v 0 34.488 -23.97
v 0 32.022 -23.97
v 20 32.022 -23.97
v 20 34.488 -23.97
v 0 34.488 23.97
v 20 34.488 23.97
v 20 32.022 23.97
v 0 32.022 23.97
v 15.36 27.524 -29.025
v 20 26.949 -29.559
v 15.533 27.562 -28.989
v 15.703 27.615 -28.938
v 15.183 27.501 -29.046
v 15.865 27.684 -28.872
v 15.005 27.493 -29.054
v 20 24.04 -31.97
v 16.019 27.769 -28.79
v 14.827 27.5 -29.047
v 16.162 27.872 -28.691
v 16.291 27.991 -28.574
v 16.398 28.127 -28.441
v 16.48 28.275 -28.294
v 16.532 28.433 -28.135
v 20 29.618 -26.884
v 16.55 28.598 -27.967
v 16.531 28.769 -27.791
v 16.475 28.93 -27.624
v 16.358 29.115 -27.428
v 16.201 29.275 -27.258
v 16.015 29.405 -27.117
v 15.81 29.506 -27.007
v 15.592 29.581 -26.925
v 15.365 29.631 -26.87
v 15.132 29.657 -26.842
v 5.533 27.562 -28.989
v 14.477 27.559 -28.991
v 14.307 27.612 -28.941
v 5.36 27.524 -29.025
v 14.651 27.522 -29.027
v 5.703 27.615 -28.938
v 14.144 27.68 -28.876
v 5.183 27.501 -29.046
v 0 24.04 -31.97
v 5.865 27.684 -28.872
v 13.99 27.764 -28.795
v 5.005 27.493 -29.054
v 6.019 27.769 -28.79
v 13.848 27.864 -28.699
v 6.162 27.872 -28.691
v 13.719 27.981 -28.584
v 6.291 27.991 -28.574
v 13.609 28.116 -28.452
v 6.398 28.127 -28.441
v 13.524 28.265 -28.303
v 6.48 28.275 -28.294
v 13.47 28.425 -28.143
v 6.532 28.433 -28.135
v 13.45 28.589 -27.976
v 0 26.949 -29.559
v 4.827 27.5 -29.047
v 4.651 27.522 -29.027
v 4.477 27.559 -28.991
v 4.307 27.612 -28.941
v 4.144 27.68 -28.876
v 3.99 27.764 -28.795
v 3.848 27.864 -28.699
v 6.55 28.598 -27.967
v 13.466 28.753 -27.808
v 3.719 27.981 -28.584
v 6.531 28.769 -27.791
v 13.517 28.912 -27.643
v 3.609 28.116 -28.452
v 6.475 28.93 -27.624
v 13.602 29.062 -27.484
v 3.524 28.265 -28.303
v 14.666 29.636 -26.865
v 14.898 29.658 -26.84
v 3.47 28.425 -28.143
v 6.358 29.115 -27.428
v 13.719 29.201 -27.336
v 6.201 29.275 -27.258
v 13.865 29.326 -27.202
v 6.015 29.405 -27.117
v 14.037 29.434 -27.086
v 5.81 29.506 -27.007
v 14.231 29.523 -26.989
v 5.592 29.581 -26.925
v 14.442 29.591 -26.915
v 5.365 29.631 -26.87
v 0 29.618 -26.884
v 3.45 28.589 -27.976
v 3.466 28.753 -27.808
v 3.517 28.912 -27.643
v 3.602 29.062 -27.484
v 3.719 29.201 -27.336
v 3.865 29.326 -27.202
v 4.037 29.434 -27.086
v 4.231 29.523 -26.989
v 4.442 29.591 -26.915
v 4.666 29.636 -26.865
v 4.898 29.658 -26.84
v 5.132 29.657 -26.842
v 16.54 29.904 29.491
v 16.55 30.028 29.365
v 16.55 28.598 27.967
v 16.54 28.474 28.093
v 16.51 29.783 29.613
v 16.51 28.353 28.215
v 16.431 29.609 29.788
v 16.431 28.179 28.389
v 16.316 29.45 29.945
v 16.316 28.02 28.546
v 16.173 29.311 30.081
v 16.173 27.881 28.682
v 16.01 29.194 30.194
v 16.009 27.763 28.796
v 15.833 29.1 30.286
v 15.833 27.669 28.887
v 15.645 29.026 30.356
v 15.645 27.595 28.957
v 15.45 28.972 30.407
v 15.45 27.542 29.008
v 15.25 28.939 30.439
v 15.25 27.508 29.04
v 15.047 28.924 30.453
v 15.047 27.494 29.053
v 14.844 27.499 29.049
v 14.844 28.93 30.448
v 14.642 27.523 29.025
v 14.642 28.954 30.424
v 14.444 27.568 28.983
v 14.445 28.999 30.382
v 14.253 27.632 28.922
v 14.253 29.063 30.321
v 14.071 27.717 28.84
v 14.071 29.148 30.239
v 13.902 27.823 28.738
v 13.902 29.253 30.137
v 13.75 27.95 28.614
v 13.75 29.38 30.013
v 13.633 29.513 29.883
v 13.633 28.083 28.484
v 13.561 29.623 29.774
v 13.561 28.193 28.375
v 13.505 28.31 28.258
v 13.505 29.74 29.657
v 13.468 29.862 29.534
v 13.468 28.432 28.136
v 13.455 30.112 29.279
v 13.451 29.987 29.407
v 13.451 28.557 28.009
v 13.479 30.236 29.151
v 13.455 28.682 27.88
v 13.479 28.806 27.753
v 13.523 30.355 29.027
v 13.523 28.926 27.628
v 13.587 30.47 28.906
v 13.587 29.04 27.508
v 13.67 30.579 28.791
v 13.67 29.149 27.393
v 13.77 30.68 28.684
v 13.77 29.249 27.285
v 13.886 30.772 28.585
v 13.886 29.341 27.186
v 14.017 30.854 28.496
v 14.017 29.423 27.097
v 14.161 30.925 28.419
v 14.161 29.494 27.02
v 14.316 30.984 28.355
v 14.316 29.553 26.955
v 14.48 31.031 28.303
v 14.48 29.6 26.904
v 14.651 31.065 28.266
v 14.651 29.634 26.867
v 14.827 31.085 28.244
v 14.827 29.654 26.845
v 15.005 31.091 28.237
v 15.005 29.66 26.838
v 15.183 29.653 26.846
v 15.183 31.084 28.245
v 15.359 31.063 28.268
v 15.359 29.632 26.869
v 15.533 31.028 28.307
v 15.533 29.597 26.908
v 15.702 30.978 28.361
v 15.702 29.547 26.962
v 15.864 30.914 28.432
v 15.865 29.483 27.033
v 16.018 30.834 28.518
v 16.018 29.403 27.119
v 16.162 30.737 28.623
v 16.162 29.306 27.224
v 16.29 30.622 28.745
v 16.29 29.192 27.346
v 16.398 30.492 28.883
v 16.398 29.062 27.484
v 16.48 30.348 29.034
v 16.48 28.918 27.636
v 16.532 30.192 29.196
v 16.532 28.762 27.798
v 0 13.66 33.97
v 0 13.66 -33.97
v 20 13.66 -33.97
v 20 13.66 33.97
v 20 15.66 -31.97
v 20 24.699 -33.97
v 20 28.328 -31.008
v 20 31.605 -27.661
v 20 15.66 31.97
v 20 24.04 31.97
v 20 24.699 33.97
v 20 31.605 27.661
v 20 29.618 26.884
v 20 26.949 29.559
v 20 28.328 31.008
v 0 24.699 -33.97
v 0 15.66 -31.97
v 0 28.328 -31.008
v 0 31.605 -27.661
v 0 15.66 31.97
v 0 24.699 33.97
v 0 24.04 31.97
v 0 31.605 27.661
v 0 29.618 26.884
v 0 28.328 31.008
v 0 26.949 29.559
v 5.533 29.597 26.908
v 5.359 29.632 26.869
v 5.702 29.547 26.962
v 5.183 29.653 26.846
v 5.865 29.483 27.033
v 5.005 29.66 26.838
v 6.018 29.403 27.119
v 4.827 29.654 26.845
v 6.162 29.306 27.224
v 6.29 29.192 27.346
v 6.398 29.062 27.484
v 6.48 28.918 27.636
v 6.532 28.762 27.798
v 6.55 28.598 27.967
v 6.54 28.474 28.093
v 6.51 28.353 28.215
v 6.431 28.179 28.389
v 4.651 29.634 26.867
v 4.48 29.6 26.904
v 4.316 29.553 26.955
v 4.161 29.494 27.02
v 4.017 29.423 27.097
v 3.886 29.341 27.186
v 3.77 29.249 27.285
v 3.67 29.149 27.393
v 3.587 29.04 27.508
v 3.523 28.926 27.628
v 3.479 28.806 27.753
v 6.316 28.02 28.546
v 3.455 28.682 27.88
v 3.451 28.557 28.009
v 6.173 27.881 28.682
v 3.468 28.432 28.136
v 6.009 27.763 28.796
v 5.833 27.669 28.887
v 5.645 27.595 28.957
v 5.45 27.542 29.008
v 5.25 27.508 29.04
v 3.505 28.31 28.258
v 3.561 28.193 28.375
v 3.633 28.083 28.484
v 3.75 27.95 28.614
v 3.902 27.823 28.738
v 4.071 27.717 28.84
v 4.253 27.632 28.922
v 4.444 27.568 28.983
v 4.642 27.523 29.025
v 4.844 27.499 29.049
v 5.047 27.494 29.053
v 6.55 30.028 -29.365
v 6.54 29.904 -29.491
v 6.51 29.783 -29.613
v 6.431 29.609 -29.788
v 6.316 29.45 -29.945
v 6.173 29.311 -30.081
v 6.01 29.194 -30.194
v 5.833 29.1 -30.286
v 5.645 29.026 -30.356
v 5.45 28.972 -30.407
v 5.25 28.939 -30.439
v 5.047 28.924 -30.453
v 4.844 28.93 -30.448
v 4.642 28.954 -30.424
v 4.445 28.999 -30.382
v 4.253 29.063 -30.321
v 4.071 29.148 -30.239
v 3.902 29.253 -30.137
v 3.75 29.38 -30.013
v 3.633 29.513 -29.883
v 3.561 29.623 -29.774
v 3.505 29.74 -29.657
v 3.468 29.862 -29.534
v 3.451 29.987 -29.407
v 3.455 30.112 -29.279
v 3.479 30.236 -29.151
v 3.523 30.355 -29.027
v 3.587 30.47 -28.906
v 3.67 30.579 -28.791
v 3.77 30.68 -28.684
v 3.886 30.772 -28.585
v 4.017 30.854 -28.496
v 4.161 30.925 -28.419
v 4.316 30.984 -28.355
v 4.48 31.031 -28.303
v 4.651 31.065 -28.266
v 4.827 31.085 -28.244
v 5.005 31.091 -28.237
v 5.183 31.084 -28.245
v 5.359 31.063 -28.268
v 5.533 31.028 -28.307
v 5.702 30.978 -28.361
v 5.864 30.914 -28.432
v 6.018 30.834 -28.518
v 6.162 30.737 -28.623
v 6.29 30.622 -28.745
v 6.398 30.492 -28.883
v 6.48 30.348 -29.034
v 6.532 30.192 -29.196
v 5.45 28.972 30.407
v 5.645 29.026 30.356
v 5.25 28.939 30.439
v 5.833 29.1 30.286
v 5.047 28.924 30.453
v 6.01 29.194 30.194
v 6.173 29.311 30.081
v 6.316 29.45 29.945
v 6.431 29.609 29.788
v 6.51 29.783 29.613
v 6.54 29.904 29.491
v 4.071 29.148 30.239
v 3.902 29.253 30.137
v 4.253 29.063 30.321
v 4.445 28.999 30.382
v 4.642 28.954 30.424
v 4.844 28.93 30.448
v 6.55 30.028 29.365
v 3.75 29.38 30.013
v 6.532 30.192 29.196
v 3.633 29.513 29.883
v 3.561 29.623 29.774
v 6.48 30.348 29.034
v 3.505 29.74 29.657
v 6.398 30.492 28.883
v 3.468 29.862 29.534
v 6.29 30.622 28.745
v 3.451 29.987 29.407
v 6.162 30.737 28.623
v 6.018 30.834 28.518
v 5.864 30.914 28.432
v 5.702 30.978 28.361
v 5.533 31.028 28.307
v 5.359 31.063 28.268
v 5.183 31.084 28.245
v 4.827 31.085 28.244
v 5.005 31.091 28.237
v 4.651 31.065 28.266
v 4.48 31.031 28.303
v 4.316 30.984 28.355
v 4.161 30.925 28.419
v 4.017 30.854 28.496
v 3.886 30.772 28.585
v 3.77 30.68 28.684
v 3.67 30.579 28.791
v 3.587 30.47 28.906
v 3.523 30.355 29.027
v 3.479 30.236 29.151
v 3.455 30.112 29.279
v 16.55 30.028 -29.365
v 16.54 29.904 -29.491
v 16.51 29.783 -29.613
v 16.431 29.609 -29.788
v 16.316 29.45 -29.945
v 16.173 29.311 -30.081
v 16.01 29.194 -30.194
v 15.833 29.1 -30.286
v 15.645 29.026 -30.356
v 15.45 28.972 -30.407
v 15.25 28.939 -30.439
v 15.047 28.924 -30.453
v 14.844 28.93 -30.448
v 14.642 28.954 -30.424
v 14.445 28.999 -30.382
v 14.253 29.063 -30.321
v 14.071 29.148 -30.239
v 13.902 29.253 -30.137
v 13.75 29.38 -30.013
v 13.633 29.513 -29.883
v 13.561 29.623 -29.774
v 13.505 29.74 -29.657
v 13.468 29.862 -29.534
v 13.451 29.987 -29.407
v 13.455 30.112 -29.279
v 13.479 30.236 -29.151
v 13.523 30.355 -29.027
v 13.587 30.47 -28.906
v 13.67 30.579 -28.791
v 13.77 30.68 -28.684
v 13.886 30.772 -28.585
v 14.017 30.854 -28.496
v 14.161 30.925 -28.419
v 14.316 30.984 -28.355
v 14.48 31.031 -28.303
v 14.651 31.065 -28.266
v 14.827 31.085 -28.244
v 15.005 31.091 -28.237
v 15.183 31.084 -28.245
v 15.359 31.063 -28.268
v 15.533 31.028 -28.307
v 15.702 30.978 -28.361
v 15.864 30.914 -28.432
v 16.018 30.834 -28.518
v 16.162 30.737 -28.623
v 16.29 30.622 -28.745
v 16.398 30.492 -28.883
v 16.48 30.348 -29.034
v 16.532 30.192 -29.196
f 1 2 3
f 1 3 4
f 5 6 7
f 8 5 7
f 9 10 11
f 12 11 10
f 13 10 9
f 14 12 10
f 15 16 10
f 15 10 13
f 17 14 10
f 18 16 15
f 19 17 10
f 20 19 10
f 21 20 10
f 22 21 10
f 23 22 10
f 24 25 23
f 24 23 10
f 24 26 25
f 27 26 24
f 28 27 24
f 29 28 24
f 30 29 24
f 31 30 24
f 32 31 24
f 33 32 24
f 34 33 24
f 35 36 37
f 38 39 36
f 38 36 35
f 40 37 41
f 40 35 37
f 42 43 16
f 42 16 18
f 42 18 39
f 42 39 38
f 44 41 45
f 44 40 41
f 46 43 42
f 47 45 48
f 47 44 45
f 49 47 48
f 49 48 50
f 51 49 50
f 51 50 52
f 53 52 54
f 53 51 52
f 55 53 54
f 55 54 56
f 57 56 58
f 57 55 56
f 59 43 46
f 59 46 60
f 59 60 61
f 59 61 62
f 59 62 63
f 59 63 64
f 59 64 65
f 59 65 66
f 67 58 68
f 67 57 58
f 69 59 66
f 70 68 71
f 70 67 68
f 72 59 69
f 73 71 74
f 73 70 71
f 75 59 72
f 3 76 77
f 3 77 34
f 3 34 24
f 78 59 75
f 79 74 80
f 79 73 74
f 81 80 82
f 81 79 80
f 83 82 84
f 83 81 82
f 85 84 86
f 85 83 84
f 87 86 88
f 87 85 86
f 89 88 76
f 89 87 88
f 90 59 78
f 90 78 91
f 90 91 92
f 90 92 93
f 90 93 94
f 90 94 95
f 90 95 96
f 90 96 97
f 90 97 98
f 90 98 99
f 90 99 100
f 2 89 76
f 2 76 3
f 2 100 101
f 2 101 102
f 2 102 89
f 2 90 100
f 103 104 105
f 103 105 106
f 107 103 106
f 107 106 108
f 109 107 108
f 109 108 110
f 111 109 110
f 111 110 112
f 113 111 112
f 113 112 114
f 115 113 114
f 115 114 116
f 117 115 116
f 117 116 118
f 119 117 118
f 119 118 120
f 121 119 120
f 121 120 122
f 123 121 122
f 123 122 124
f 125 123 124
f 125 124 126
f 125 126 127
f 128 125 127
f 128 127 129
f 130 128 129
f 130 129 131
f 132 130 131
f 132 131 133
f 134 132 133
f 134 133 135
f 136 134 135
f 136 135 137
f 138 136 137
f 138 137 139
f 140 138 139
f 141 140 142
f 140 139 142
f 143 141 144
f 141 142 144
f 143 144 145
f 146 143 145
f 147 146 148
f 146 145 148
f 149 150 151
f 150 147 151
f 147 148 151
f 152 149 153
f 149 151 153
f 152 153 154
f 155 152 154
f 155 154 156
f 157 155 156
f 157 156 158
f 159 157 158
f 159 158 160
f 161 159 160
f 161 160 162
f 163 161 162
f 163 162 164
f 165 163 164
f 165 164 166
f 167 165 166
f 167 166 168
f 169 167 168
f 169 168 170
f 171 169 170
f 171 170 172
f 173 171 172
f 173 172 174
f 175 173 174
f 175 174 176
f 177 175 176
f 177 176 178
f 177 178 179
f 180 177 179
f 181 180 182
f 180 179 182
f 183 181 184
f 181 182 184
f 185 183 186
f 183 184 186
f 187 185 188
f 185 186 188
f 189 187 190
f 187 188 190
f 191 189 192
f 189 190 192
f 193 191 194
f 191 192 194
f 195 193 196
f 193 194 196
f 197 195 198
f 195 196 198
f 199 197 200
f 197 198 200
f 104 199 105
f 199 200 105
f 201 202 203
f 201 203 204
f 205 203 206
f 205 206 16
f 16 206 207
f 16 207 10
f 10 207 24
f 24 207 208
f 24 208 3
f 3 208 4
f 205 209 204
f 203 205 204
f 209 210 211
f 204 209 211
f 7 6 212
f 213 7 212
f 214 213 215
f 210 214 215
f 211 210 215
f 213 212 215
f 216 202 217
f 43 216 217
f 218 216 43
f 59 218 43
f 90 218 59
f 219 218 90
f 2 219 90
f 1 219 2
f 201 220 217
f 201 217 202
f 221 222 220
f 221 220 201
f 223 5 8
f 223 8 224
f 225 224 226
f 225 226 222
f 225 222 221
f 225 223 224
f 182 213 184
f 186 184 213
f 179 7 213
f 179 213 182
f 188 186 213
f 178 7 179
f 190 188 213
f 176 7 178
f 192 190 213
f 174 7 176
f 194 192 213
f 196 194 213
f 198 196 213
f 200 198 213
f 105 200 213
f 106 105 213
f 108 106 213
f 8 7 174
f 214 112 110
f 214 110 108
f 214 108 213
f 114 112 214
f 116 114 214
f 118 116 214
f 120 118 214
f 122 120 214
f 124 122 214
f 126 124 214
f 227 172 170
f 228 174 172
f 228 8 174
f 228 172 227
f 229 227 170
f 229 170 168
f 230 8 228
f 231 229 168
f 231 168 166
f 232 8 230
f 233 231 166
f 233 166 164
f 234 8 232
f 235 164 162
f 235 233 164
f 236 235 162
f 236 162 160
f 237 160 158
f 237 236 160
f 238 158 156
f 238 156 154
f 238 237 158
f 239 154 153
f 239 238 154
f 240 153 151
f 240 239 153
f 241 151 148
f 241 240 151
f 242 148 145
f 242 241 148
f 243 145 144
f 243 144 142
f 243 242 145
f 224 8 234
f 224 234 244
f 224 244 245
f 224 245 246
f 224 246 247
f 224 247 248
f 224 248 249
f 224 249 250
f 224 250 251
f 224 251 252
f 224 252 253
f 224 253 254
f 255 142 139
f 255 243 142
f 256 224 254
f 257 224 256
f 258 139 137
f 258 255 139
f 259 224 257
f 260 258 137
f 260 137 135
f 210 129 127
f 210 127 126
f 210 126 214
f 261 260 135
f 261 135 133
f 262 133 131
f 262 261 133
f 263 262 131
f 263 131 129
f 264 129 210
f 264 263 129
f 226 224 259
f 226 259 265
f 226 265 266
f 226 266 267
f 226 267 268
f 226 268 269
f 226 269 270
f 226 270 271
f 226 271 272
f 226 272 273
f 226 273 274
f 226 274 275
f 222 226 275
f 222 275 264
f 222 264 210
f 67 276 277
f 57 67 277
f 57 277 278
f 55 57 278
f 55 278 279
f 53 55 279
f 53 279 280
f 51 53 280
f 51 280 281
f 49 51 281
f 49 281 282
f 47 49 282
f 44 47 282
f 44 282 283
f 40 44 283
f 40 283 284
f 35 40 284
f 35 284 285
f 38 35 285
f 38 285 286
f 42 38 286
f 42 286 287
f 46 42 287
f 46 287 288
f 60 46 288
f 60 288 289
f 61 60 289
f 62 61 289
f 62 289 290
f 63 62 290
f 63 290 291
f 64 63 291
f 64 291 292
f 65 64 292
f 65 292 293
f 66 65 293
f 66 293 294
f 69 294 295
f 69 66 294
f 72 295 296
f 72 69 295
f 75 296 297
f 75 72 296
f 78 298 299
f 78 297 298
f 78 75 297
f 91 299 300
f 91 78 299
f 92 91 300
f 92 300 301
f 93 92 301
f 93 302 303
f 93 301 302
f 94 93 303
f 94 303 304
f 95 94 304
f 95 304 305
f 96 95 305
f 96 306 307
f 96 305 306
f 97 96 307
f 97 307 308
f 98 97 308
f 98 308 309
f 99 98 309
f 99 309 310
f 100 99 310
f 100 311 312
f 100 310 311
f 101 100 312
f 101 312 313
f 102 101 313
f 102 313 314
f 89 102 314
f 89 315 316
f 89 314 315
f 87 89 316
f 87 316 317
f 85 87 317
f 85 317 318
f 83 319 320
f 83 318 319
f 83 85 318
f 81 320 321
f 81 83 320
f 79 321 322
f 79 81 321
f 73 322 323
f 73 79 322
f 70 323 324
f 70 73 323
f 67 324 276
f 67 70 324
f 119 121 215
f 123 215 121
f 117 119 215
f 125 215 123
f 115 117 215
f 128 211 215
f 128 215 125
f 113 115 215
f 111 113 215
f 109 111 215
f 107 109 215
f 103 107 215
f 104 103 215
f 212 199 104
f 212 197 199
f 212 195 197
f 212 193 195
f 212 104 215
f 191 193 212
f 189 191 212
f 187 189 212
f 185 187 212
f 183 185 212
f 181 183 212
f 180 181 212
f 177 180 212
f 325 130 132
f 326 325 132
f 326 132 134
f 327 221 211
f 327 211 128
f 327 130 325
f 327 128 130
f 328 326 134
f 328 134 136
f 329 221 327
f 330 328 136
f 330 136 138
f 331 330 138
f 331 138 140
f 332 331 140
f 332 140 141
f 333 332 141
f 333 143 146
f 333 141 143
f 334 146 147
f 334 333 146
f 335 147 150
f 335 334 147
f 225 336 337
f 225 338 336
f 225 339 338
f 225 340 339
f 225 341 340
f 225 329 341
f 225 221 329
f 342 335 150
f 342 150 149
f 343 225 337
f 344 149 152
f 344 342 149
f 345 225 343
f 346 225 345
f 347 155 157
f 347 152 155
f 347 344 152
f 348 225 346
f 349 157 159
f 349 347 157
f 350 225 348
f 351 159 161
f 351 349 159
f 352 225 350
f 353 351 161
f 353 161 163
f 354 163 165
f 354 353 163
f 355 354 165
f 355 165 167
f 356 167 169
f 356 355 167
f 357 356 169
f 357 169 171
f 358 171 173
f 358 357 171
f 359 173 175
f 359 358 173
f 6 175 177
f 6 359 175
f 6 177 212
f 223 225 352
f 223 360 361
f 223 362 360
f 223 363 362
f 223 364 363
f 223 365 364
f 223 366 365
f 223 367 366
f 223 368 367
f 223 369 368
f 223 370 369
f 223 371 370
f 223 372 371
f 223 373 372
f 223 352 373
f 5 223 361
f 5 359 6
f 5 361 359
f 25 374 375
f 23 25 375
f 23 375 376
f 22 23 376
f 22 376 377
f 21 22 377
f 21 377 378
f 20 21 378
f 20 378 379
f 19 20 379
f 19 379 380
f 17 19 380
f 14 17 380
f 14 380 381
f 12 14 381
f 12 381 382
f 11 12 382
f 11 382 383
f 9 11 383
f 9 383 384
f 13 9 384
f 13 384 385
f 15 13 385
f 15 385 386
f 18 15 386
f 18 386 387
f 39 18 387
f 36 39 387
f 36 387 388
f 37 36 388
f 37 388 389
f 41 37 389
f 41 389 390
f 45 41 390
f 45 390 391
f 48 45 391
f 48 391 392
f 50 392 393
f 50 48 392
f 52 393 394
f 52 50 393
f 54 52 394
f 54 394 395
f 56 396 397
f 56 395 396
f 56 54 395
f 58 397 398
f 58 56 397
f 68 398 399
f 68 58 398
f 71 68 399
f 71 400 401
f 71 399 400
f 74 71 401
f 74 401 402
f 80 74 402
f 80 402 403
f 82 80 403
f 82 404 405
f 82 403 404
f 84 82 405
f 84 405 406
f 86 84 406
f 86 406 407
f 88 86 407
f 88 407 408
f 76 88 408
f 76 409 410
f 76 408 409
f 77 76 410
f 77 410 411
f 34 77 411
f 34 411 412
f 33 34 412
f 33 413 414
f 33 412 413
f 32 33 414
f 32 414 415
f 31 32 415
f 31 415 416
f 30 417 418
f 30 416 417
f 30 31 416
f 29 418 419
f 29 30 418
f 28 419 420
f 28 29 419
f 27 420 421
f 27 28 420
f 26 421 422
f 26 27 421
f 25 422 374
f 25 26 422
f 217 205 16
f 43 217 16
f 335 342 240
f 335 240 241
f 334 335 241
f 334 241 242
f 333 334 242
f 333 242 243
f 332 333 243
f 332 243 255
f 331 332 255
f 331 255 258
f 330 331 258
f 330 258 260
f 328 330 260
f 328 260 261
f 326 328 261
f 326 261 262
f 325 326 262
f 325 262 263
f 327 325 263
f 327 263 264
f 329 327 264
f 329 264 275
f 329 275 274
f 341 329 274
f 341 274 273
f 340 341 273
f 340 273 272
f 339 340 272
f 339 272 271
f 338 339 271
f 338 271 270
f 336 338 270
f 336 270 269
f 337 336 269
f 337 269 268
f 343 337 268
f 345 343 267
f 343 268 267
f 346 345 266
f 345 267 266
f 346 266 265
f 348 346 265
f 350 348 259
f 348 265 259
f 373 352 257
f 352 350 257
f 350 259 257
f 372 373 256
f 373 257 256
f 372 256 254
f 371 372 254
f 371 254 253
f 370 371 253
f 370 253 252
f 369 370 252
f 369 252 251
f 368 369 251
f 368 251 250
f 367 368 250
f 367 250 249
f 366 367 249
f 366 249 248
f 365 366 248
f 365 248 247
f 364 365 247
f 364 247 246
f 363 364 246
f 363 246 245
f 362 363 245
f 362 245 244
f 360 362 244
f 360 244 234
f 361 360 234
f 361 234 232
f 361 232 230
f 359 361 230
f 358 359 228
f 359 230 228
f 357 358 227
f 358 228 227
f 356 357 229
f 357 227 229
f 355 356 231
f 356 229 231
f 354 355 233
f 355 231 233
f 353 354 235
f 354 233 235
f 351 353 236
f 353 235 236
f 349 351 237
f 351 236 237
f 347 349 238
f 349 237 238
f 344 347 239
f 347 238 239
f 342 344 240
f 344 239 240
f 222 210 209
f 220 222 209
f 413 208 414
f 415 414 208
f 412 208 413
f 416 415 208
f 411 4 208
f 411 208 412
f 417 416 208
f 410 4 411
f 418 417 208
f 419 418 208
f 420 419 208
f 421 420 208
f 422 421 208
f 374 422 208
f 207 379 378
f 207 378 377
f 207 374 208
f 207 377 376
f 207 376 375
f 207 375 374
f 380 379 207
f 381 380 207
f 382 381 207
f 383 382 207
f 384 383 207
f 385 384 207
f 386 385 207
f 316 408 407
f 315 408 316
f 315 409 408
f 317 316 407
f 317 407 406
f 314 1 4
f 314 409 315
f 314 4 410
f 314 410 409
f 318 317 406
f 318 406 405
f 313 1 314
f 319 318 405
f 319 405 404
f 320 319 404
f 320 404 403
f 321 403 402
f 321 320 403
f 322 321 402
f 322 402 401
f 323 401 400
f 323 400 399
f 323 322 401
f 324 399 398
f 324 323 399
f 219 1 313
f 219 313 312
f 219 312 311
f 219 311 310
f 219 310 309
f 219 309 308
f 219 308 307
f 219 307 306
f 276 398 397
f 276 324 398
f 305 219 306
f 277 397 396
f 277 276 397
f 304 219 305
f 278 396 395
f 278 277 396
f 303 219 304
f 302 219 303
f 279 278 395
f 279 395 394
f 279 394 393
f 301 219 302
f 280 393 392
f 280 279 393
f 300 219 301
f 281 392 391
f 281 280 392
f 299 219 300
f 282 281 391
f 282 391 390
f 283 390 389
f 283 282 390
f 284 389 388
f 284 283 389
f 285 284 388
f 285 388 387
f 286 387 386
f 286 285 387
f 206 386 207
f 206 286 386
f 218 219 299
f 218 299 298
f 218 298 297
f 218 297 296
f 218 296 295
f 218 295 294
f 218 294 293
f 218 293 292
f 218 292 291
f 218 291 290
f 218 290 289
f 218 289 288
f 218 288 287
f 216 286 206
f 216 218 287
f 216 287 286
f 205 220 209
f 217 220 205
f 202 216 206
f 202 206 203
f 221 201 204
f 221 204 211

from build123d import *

# Parameters (mm, degrees)
BOSS_EXTRU_1_DEPTH         = 20
D_GAGEMENT_START           = 39.969957368
D_GAGEMENT_M2_51_OUTLINE_R = 1.55
D_GAGEMENT_M2_51_DEPTH     = 2.030042632


# Read off the part's stored shape, not the designer's step: Dégagement M2.51
with BuildPart() as part:
    # Esquisse1 → Boss.-Extru.1 (new body)
    with BuildSketch(Plane(origin=(0, 0, 0), x_dir=(0, 0, -1), z_dir=(1, 0, 0))):
        with BuildLine():
            Line((-31.97, 24.039948003), (-31.97, 15.66))
            Line((-31.97, 15.66), (31.97, 15.66))
            Line((31.97, 15.66), (31.97, 24.039948003))
            ThreePointArc((31.97, 24.039948003), (28.253337793, 28.315170908), (23.97, 32.022478043))
            Line((23.97, 32.022478043), (23.97, 34.488245824))
            ThreePointArc((23.97, 34.488245824), (29.380578316, 30.013024137), (33.97, 24.698969614))
            Line((33.97, 24.698969614), (33.97, 13.66))
            Line((33.97, 13.66), (-33.97, 13.66))
            Line((-33.97, 13.66), (-33.97, 24.698969614))
            ThreePointArc((-33.97, 24.698969614), (-29.380578316, 30.013024137), (-23.97, 34.488245824))
            Line((-23.97, 34.488245824), (-23.97, 32.022478043))
            ThreePointArc((-23.97, 32.022478043), (-28.253337793, 28.315170908), (-31.97, 24.039948003))
        make_face()
    extrude(amount=BOSS_EXTRU_1_DEPTH)

    # Dégagement M2.51 outline → Dégagement M2.51 (cut)
    with BuildSketch(Plane(origin=(0, 0, 0), x_dir=(1, 0, 0), z_dir=(0, 0.7149556691384648, -0.6991697870809138)).offset(D_GAGEMENT_START)):
        with Locations((5, 0)):
            Circle(D_GAGEMENT_M2_51_OUTLINE_R)
        with Locations((15, 0)):
            Circle(D_GAGEMENT_M2_51_OUTLINE_R)
    d_gagement_m2_51 = extrude(amount=D_GAGEMENT_M2_51_DEPTH, mode=Mode.SUBTRACT)

    # Symétrie1: Dégagement M2.51 across plane
    add(d_gagement_m2_51.mirror(Plane.XY), mode=Mode.SUBTRACT)


solid = part.part
